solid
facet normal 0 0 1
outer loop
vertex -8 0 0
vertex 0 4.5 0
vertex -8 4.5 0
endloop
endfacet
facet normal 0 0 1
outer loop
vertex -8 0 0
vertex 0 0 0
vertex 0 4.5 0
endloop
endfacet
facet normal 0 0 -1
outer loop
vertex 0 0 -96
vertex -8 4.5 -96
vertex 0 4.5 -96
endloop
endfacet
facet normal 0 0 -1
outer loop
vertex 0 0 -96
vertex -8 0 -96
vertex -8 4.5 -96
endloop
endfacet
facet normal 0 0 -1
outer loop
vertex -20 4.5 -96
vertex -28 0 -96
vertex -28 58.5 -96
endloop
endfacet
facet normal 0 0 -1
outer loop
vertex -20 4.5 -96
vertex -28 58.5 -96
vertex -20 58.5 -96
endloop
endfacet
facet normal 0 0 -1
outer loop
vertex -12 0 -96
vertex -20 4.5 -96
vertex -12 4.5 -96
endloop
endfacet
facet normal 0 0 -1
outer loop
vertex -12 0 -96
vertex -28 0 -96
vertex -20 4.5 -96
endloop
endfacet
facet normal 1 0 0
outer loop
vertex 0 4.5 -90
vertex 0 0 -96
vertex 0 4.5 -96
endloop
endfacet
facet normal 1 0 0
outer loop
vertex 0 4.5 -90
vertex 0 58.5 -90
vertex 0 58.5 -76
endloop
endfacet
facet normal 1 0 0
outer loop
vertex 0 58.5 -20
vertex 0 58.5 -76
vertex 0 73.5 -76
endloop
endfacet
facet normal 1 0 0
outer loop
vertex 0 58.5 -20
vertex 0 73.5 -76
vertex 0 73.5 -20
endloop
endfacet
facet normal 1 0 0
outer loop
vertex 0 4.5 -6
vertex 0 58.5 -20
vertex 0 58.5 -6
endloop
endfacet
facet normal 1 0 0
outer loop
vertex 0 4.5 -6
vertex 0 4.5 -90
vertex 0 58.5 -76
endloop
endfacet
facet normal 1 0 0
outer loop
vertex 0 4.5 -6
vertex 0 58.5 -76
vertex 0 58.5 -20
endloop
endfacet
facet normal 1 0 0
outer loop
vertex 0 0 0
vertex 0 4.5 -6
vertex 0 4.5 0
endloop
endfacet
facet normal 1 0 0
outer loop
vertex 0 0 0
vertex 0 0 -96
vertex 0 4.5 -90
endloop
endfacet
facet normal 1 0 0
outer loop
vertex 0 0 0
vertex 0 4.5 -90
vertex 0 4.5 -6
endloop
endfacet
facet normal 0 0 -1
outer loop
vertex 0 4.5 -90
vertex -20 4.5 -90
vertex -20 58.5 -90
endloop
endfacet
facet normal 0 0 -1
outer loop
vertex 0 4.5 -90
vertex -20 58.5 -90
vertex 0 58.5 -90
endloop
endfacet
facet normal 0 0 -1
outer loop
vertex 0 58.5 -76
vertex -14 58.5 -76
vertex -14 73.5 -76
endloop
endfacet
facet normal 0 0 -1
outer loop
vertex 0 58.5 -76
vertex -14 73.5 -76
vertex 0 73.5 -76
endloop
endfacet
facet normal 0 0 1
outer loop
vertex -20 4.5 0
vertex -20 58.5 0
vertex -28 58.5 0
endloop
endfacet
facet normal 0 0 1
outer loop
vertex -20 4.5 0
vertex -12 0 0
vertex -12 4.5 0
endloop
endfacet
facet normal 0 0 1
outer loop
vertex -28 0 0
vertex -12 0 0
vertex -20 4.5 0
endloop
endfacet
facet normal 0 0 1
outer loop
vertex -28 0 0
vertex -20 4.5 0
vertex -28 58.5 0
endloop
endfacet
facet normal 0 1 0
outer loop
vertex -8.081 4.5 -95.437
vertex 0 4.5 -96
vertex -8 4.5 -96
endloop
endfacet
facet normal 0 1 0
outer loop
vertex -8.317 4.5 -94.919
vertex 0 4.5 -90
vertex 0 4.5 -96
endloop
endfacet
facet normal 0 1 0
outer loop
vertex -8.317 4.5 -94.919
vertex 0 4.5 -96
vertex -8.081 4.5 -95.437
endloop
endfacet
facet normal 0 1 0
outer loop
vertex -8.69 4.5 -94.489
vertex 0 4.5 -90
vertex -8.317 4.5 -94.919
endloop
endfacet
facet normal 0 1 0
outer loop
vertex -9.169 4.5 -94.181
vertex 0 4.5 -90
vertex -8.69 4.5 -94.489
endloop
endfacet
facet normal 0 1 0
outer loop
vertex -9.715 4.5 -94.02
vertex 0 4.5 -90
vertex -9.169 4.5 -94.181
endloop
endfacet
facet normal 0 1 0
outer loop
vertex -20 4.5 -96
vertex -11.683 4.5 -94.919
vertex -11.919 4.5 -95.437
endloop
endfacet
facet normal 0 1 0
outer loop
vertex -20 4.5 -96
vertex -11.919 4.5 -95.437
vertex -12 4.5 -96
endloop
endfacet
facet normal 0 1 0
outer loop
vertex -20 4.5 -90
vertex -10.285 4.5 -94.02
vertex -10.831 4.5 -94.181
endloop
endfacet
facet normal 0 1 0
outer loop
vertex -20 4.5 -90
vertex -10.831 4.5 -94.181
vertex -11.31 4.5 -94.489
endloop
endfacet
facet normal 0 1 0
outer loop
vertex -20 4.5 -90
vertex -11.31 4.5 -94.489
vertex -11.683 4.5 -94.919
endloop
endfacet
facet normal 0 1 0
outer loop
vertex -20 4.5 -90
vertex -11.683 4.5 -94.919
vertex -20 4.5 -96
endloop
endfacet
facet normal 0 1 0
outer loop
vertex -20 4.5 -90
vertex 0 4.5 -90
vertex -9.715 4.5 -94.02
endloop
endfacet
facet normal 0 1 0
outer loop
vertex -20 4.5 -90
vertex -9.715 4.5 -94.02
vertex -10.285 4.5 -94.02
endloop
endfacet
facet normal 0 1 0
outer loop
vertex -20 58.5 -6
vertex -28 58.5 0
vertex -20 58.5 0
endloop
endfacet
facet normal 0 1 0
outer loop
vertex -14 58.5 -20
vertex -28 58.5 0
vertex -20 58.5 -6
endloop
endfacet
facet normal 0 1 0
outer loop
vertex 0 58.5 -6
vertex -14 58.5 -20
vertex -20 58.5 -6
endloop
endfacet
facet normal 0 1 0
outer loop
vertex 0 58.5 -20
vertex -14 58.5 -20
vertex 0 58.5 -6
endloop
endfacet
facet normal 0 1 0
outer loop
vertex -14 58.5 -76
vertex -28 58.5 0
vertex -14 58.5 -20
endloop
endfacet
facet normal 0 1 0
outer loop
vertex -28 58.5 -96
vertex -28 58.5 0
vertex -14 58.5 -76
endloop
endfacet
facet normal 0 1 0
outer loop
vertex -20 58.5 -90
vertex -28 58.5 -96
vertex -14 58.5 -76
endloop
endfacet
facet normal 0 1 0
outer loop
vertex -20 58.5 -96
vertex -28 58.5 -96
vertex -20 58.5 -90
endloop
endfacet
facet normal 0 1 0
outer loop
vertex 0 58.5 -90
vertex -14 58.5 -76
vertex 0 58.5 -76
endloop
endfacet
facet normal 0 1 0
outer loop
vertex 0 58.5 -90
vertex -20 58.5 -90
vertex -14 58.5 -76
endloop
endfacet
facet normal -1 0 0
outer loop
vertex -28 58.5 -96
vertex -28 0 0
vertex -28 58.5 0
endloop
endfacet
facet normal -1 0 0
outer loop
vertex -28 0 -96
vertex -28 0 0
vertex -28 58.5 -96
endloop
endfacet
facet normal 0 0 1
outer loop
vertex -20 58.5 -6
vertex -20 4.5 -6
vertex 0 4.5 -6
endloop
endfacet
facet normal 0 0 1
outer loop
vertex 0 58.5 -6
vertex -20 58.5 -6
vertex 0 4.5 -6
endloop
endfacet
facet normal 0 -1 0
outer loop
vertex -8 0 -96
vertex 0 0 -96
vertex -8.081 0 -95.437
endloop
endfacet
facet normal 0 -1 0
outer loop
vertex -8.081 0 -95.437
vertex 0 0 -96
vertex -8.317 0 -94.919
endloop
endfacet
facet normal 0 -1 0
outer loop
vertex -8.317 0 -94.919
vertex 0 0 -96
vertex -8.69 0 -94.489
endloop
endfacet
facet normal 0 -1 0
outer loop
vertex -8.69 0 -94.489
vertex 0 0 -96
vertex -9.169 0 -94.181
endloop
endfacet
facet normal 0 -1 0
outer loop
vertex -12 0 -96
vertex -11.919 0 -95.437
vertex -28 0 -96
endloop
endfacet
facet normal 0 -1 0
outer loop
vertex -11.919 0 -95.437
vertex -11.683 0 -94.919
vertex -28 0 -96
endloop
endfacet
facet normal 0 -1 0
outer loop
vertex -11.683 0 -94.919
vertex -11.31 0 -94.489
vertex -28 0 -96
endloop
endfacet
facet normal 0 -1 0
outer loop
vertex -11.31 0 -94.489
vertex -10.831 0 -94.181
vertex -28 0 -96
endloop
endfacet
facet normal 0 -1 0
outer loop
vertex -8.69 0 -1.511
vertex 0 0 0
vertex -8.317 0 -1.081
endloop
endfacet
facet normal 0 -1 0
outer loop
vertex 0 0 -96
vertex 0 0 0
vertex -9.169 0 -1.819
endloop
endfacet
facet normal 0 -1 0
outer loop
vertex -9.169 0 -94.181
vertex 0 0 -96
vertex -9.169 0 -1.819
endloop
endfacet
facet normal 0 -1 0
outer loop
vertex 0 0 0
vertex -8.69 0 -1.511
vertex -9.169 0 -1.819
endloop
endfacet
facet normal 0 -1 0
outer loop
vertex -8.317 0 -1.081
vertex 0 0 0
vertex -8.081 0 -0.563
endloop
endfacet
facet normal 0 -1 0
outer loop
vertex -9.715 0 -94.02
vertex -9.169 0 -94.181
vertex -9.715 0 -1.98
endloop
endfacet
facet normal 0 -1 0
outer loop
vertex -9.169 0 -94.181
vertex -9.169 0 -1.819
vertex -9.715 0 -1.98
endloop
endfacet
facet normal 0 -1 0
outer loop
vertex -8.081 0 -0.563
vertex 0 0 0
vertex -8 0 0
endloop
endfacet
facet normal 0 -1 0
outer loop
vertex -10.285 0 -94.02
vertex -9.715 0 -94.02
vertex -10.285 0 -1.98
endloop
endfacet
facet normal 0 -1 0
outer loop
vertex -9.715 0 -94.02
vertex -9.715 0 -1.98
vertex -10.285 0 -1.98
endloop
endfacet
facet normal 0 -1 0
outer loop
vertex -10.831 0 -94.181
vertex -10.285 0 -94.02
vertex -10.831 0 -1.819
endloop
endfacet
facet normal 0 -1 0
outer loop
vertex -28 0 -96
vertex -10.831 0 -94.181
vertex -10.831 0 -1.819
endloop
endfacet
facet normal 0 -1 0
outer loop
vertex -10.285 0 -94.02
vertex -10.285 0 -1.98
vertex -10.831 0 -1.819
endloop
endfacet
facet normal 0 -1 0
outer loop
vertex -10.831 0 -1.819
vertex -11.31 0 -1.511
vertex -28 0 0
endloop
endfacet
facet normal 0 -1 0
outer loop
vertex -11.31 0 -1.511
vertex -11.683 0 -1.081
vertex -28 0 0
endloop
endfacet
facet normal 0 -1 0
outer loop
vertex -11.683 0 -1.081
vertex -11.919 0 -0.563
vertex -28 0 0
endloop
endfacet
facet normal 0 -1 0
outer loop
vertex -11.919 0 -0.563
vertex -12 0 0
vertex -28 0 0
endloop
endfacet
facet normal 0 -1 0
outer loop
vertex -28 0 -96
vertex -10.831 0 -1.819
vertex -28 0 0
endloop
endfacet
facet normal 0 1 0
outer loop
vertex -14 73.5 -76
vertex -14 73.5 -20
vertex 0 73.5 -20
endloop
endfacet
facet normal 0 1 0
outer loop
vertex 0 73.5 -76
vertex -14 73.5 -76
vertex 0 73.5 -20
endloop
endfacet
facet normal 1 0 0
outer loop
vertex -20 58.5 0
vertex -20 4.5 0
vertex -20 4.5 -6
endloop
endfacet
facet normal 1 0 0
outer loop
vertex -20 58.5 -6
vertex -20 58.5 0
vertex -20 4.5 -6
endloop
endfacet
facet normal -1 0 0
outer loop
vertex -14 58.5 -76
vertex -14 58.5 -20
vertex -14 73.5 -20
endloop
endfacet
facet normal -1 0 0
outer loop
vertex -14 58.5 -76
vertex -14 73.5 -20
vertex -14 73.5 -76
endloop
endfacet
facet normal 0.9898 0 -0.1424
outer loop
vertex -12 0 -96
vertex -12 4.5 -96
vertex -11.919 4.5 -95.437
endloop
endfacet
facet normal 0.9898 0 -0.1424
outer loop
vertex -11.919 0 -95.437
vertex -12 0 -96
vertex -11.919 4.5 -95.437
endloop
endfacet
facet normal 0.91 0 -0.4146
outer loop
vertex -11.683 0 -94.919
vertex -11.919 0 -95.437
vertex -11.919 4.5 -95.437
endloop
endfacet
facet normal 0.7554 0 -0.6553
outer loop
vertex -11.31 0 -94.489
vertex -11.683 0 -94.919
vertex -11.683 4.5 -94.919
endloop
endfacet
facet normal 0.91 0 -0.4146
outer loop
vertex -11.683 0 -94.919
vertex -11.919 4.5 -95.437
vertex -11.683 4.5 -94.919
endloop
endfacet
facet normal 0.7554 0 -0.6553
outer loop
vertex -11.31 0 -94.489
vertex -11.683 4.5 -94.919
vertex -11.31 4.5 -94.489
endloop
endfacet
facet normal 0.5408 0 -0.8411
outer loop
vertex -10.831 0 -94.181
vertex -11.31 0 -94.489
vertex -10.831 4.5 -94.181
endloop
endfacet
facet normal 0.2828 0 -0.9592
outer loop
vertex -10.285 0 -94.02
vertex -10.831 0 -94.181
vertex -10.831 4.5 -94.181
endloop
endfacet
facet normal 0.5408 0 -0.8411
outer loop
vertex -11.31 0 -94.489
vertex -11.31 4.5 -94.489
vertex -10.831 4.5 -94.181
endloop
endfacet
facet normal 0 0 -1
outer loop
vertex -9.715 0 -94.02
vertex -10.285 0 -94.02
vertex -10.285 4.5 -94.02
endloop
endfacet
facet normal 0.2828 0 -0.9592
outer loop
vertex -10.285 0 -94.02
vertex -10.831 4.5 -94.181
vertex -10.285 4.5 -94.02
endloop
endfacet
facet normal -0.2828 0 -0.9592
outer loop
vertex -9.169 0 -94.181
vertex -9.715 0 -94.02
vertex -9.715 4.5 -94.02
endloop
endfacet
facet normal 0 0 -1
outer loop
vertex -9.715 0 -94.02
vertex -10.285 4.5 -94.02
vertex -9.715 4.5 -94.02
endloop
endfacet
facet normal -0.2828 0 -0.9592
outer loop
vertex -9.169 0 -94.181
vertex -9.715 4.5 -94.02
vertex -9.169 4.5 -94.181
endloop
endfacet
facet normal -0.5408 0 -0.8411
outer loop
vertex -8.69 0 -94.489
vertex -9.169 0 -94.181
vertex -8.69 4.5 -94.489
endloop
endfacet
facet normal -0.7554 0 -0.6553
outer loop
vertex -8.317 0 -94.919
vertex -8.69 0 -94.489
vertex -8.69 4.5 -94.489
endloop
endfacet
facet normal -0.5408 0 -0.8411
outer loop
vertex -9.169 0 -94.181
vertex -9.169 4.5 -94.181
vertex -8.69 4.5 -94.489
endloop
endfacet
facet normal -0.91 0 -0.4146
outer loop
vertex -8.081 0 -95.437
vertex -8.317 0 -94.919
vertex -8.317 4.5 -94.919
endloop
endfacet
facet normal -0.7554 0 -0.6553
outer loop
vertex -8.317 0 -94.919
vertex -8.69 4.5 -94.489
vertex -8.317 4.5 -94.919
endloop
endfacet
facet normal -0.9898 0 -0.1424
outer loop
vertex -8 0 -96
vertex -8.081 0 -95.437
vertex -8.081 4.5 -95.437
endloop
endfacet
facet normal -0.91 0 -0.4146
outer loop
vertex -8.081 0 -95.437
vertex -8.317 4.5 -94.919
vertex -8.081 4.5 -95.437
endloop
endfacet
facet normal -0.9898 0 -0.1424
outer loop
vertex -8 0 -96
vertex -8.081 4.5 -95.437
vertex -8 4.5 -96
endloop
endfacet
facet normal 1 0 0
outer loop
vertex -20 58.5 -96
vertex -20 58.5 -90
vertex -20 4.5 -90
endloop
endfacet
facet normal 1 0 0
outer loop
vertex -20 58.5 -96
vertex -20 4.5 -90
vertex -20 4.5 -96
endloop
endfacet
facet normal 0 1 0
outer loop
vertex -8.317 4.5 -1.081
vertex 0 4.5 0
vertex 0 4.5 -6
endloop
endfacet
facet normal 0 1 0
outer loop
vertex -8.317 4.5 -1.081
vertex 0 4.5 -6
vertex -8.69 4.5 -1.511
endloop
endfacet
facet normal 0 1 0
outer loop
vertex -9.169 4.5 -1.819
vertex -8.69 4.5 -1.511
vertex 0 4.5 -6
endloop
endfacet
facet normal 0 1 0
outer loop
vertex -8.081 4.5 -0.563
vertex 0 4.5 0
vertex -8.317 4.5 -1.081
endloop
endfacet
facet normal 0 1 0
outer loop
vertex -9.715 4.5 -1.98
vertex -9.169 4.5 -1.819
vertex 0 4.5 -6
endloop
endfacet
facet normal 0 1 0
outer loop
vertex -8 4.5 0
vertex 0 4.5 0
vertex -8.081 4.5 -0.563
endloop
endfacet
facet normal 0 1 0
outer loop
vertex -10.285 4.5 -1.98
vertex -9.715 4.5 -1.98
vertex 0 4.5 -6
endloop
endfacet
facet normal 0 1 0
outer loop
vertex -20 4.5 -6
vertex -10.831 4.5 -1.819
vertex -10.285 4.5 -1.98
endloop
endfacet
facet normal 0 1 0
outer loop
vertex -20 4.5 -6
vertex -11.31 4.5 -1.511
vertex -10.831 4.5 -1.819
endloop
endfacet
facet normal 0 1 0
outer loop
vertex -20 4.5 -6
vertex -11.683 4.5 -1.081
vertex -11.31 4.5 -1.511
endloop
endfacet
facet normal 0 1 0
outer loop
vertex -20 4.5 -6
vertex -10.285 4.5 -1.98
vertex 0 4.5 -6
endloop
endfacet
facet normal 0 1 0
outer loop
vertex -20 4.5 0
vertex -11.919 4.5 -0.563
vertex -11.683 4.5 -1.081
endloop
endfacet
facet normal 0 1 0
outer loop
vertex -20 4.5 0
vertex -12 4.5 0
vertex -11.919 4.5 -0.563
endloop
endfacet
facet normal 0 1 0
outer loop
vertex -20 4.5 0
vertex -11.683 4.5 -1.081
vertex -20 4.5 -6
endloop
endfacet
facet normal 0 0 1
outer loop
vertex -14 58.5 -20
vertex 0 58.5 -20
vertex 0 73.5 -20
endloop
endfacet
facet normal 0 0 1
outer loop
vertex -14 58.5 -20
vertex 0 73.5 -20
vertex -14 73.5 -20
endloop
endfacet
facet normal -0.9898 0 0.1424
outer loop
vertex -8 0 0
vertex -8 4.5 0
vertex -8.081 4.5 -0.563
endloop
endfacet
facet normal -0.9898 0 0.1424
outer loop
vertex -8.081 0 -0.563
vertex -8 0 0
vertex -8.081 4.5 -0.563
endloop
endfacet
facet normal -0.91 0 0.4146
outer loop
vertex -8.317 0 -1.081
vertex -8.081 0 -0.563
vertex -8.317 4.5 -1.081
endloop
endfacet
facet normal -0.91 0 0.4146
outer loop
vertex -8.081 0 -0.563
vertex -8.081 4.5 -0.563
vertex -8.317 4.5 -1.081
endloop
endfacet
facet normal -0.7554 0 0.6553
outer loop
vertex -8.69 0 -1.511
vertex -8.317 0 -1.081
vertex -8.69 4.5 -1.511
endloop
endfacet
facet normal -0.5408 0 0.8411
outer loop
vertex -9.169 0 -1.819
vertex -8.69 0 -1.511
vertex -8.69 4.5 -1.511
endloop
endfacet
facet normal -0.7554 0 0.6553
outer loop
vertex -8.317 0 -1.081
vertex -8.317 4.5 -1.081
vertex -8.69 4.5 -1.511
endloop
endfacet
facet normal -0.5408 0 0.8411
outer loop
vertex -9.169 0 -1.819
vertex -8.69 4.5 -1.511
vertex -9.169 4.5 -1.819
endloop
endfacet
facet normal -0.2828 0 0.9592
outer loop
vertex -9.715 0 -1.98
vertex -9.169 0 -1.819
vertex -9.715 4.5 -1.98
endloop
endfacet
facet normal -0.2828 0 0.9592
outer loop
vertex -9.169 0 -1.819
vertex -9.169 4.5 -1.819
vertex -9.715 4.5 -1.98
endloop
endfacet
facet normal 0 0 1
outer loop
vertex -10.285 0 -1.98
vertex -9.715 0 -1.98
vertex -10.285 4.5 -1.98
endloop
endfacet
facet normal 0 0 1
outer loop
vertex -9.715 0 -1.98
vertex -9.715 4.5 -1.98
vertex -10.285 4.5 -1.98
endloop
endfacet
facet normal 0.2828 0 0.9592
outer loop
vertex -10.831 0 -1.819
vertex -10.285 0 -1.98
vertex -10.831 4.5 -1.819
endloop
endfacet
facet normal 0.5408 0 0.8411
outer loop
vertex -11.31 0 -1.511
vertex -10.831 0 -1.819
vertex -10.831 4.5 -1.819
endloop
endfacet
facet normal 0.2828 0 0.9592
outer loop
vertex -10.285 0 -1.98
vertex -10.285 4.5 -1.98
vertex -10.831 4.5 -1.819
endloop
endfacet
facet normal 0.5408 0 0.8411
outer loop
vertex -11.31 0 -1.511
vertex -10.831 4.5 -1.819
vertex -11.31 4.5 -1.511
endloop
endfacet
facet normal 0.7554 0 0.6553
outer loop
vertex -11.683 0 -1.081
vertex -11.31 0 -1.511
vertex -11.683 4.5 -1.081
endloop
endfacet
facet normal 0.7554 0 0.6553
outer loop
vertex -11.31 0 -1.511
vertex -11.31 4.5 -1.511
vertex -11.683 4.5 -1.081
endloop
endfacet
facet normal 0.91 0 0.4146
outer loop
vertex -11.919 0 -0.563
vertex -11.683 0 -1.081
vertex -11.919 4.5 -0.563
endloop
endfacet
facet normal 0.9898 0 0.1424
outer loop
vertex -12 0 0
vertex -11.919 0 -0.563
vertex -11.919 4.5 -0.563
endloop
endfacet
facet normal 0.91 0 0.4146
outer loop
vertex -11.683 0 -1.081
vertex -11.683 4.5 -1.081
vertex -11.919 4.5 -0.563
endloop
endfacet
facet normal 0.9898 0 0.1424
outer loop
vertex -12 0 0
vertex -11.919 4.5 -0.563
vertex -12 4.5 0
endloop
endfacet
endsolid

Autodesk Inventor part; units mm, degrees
ref_plane "YZ Plane" through (0, 0, 0) normal (1, 0, 0) x (0, 1, 0)
ref_plane "XZ Plane" through (0, 0, 0) normal (0, 1, 0) x (-1, 0, 0)
ref_plane "XY Plane" through (0, 0, 0) normal (0, 0, 1) x (1, 0, 0)
sketch "Sketch3" plane through (0, 0, 0) normal (0, 1, 0) x (-1, 0, 0)
  line L0 (0, 0) -> (28, 0)
  line L1 (28, 0) -> (28, -96)
  line L2 (28, -96) -> (0, -96)
  line L3 (0, -96) -> (0, 0)
  dimension "d6" = 28
  dimension "d7" = 96
extrude "Extrusion3" add sketch "Sketch3" along normal blind 4.5
sketch "Sketch4" plane through (0, 4.5, 0) normal (0, 1, 0) x (1, 0, 0)
  line L0 (0, 96) -> (-28, 96) projected
  line L1 (-28, 96) -> (-28, 0) projected
  line L2 (-28, 0) -> (0, 0) projected
  line L3 (0, 0) -> (0, 96) projected
  line L4 (-28, 0) -> (-20, 0)
  line L5 (-20, 0) -> (-20, 96)
  line L6 (-20, 96) -> (-28, 96)
  line L7 (-28, 96) -> (-28, 0)
  line L8 (0, 0) -> (-20, 0)
  line L9 (-20, 0) -> (-20, 6)
  line L10 (-20, 6) -> (0, 6)
  line L11 (0, 6) -> (0, 0)
  line L12 (0, 96) -> (-20, 96)
  line L13 (-20, 96) -> (-20, 90)
  line L14 (-20, 90) -> (0, 90)
  line L15 (0, 90) -> (0, 96)
  dimension "d10" = 8
  dimension "d11" = 6
  dimension "d12" = 6
extrude "Extrusion4" add sketch "Sketch4" along normal blind 54 contours L5 L2 L1 L0 | L3 L10 L5 L14
sketch "Sketch5" plane through (0, 4.5, 0) normal (0, 1, 0) x (1, 0, 0)
  line L0 (0, 6) -> (-20, 6) projected
  line L1 (-20, 6) -> (-20, 0) projected
  line L2 (-20, 0) -> (0, 0) projected
  line L3 (0, 0) -> (0, 6) projected
  circle A0 centre (-10, 0) radius 2
  line L4 (-20, 96) -> (-20, 90) projected
  line L5 (-20, 90) -> (0, 90) projected
  line L6 (0, 90) -> (0, 96) projected
  line L7 (0, 96) -> (-20, 96) projected
  circle A1 centre (-10, 96) radius 2
  point P0 (-8, 0)
  point P1 (-12, 0)
  dimension "d15" = 4
  dimension "d16" = 4
extrude "Extrusion5" cut sketch "Sketch5" against normal through all contours L2 A0 | A1 L7 | L7 A1 picked at (-9.3527, 0.1595)
sketch "Sketch6" plane through (0, 58.5, 0) normal (0, 1, 0) x (1, 0, 0)
  line L0 (-20, 6) -> (0, 6) projected
  line L1 (0, 6) -> (0, 90) projected
  line L2 (0, 90) -> (-20, 90) projected
  line L3 (-20, 90) -> (-20, 96) projected
  line L4 (-20, 96) -> (-28, 96) projected
  line L5 (-28, 96) -> (-28, 0) projected
  line L6 (-28, 0) -> (-20, 0) projected
  line L7 (-20, 0) -> (-20, 6) projected
  line L8 (0, 20) -> (-14, 20)
  line L9 (-14, 20) -> (-14, 76)
  line L10 (-14, 76) -> (0, 76)
  line L11 (0, 76) -> (0, 20)
  point P0 (0, 0)
  point P1 (0, 76)
  dimension "d19" = 14
  dimension "d21" = 14
  dimension "d22" = 14
extrude "Extrusion6" add sketch "Sketch6" along normal blind 15 contours L8 L9 L10 L1
properties part number "driver"
